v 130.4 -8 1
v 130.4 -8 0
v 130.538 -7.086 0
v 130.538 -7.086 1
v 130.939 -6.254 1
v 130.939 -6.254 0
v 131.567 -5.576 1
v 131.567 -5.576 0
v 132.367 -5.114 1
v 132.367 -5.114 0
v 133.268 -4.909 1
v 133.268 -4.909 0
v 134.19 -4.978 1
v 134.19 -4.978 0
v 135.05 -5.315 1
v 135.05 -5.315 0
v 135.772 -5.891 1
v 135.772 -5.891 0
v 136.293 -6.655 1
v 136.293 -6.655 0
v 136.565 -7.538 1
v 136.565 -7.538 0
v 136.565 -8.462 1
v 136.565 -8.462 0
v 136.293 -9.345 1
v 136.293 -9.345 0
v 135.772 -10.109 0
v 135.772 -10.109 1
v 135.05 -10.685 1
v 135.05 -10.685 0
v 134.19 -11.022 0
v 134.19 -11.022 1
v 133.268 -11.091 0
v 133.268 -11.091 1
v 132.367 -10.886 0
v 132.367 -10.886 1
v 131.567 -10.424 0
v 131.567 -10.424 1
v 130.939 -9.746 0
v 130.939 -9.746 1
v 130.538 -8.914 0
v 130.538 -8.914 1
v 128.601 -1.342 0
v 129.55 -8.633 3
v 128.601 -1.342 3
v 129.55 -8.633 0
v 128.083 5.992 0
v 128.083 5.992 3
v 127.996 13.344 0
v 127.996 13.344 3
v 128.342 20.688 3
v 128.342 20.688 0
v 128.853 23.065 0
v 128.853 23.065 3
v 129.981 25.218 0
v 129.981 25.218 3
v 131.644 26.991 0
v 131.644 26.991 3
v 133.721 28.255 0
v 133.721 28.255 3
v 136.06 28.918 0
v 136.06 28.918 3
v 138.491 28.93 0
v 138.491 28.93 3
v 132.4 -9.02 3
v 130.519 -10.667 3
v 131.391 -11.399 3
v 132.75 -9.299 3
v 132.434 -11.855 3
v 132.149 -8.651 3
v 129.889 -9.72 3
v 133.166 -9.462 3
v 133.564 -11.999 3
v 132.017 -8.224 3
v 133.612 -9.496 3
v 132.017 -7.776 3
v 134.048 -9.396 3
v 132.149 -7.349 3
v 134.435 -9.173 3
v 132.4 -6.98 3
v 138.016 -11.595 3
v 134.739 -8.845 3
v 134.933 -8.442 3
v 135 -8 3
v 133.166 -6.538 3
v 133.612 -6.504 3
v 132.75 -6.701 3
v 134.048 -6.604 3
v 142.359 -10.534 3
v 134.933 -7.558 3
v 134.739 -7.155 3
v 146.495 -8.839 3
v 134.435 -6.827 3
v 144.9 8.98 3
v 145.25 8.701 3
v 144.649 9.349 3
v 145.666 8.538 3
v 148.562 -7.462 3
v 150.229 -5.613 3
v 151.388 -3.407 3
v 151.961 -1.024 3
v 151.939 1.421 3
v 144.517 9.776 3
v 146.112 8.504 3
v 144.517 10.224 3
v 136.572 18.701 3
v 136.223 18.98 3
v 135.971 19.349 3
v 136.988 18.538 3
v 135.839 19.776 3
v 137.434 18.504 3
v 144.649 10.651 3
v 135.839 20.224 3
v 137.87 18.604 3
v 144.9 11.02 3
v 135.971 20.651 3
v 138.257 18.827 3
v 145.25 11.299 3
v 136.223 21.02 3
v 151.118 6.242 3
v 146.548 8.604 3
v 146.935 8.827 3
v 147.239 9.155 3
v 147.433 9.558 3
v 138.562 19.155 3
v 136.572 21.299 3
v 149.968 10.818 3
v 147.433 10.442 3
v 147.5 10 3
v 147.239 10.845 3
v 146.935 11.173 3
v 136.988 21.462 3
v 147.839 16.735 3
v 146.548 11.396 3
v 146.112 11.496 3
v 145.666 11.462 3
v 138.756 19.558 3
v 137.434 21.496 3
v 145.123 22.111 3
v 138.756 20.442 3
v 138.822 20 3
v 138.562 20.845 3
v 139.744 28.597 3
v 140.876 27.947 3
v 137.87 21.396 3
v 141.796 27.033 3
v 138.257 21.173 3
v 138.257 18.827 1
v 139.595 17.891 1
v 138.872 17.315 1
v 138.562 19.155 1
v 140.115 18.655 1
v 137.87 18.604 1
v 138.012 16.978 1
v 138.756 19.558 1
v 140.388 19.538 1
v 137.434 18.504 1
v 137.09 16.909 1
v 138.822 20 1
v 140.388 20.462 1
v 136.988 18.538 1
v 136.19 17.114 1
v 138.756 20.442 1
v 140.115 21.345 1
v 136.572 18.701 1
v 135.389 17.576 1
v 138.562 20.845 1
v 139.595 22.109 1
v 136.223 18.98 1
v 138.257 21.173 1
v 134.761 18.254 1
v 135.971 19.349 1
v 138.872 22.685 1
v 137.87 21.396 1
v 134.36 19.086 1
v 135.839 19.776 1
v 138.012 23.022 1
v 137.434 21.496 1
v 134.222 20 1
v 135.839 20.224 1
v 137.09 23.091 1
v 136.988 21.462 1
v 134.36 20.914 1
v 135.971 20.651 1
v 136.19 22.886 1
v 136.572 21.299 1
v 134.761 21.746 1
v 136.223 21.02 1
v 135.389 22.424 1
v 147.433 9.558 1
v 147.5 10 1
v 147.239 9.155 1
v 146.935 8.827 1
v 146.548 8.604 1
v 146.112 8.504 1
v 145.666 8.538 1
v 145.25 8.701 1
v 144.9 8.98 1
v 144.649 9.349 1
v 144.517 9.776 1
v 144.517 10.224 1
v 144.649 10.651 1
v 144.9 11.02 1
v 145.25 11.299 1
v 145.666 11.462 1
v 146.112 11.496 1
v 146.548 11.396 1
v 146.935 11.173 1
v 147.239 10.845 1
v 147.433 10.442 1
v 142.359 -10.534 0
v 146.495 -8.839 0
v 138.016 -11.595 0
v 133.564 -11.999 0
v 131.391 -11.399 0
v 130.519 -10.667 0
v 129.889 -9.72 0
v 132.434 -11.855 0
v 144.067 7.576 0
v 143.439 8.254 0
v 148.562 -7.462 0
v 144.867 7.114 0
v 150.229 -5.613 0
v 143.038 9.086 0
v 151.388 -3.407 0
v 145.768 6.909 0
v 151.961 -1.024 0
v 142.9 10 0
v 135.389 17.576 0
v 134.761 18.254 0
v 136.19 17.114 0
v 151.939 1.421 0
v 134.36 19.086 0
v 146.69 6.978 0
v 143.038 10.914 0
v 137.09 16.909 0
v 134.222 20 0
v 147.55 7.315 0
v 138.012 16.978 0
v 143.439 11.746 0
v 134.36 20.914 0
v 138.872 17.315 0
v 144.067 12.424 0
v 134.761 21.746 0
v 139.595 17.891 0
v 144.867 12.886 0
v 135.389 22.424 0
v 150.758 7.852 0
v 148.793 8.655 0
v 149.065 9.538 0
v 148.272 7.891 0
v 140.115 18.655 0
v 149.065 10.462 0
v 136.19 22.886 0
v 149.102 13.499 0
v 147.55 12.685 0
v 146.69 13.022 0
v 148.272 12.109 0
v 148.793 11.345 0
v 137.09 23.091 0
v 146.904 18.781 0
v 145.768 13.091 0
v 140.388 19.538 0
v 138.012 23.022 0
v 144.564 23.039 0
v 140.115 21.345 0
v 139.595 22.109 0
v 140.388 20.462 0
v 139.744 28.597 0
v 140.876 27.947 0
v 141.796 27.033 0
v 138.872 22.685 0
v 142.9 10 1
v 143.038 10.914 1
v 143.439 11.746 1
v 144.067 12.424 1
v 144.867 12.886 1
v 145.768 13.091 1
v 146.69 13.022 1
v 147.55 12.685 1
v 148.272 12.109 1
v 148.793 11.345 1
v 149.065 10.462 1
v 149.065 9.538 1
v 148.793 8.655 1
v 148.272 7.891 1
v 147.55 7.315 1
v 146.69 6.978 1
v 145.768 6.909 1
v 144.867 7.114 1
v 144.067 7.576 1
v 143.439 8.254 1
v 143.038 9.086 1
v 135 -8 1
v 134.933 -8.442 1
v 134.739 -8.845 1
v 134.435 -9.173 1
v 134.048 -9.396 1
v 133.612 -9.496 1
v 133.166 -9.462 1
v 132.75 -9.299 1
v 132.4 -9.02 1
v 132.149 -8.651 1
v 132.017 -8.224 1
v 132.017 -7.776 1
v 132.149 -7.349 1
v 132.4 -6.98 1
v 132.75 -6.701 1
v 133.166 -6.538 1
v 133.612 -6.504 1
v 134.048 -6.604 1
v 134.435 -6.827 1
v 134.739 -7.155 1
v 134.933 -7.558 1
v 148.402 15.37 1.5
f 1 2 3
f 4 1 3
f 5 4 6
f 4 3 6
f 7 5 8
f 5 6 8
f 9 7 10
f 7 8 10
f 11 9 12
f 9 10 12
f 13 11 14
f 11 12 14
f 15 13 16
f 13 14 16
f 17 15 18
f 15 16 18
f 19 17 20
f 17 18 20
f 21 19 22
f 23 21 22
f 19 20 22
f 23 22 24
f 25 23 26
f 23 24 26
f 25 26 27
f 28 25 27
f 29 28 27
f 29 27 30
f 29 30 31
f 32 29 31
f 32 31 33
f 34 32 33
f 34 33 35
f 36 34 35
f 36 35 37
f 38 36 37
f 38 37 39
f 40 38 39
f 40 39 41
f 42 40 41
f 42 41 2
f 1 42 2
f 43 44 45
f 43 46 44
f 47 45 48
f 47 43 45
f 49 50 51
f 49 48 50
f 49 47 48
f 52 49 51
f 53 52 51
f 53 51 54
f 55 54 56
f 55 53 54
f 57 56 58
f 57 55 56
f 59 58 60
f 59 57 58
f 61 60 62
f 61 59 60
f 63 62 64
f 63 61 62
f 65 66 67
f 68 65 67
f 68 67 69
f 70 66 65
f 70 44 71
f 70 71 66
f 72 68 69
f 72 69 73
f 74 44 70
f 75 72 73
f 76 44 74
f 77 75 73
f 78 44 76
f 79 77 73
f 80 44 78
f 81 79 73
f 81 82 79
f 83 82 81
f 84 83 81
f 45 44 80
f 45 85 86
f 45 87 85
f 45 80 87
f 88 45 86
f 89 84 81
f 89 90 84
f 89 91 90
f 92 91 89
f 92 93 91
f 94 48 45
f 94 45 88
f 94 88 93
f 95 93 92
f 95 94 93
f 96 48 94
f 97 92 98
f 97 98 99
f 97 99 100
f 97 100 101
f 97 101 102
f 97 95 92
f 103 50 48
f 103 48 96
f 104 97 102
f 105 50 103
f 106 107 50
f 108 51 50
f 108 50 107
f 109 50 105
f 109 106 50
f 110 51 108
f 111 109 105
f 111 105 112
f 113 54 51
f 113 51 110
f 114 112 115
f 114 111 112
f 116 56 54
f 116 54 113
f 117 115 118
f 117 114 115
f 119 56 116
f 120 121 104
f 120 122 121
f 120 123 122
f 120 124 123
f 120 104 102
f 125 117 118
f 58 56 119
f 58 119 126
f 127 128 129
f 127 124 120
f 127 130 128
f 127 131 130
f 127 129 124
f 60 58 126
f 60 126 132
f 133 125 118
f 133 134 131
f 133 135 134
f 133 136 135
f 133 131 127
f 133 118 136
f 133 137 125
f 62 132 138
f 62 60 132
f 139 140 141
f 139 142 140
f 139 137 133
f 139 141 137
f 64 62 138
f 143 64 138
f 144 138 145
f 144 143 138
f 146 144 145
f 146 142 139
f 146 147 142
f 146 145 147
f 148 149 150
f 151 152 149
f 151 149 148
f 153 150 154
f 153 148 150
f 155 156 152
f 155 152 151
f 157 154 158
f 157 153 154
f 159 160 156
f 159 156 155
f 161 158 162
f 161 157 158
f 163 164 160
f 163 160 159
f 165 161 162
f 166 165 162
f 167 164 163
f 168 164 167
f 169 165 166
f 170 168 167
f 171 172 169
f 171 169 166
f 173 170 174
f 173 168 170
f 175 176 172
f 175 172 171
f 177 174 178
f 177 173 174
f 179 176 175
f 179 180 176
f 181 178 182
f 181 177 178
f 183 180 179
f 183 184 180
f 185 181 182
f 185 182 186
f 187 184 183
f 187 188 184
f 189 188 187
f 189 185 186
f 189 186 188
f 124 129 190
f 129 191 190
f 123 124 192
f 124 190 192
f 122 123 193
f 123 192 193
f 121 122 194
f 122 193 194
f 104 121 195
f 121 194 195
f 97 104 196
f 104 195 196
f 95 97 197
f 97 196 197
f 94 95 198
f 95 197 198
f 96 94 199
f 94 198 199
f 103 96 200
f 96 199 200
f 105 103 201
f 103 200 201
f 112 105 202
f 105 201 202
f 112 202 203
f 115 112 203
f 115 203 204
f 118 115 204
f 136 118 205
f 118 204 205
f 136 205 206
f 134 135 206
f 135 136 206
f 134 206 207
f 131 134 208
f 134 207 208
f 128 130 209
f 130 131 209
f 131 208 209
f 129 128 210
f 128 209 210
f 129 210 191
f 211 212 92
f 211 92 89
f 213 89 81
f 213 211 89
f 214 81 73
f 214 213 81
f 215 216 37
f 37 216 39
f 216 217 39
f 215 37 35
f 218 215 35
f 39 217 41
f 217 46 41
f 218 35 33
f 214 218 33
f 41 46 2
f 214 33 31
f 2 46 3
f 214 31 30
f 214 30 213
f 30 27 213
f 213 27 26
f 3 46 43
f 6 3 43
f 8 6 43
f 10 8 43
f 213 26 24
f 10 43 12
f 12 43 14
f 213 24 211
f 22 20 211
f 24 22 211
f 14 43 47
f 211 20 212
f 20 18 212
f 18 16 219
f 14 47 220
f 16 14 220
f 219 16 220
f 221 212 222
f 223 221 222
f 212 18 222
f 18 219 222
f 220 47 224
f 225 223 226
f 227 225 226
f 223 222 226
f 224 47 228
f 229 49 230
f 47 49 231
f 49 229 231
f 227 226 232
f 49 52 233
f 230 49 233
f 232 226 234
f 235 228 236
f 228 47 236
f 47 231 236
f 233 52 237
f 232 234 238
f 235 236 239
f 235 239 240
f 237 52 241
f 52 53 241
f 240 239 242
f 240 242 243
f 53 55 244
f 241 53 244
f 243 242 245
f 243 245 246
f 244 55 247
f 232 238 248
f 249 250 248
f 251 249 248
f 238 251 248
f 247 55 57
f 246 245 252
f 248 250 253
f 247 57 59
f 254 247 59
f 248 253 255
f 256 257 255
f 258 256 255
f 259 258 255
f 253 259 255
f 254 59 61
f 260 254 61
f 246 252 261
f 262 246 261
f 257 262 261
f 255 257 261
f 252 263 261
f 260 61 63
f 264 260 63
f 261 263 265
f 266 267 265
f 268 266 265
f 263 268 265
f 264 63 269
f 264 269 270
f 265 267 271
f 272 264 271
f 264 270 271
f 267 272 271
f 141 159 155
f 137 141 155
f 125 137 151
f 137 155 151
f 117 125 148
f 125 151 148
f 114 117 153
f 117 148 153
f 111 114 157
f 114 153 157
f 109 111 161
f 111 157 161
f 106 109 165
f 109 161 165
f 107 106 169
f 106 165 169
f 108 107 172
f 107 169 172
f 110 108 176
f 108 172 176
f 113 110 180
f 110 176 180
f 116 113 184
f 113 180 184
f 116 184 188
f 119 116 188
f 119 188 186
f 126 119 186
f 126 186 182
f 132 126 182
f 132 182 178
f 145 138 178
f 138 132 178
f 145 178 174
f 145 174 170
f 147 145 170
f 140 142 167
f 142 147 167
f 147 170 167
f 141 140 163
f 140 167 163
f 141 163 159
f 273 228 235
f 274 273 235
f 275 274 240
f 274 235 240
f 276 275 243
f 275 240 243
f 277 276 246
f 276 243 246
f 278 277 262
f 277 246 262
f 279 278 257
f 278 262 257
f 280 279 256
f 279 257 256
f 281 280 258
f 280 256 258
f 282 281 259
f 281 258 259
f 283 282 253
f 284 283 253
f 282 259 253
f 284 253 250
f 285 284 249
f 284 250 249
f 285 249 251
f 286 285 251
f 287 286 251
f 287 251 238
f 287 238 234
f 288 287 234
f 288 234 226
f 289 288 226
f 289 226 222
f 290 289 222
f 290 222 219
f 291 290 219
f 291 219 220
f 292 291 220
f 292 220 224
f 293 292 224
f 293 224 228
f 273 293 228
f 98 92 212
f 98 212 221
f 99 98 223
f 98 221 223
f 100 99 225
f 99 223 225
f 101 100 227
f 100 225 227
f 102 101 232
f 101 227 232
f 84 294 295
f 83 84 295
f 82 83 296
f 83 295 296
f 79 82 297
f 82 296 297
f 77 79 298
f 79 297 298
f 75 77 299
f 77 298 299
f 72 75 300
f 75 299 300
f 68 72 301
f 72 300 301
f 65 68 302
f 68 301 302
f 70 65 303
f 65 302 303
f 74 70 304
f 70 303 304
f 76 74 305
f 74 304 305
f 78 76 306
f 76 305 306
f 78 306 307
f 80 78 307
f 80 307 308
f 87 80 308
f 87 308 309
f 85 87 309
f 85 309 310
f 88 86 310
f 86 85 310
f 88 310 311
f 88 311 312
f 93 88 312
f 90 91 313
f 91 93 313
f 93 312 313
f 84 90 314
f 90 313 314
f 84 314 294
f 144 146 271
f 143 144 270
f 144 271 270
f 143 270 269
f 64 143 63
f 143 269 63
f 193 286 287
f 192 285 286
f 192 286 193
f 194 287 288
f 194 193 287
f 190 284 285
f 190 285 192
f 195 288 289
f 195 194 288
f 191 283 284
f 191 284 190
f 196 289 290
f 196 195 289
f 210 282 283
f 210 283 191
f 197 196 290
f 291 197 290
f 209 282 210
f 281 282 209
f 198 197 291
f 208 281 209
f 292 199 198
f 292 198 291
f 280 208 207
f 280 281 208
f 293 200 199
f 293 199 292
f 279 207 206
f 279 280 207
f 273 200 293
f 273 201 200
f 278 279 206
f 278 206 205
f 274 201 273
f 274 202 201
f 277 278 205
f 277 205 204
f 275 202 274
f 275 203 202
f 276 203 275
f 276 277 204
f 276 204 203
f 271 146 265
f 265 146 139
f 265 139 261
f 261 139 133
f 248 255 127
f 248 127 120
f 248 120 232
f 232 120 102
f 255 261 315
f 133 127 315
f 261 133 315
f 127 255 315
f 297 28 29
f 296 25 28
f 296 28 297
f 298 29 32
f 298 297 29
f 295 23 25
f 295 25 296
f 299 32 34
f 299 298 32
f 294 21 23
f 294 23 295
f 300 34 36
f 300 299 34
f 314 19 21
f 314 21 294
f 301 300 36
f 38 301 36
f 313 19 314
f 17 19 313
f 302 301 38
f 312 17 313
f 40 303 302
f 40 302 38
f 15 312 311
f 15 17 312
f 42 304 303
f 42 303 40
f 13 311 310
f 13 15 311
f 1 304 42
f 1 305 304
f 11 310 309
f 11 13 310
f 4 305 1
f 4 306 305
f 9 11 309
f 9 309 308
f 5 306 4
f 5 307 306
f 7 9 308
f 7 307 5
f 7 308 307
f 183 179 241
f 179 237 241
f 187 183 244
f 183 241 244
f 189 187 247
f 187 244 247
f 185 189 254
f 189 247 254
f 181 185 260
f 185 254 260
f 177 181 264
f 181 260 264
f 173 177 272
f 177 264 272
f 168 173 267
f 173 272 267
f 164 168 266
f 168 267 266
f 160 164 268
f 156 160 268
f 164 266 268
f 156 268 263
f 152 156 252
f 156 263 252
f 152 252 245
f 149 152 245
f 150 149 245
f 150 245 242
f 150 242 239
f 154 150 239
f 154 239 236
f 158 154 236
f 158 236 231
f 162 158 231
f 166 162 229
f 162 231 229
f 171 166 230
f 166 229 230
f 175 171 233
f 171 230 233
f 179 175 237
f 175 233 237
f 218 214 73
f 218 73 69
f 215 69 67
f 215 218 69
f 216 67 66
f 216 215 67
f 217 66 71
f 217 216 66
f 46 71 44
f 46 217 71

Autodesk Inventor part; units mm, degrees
ref_plane "YZ Plane" through (0, 0, 0) normal (1, 0, 0) x (0, 1, 0)
ref_plane "XZ Plane" through (0, 0, 0) normal (0, 1, 0) x (-1, 0, 0)
ref_plane "XY Plane" through (0, 0, 0) normal (0, 0, 1) x (1, 0, 0)
sketch "スケッチ1" plane through (0, 0, 0) normal (0, 0, 1) x (1, 0, 0)
  line L0 (108, 72.831817) -> (108, -27.637331) construction
  circle A0 centre (90, 27) radius 3
  circle A1 centre (104.07345, 2) radius 6.025
  circle A2 centre (90, 27) radius 1.5
  circle A3 centre (104.07345, 2) radius 1.5
  circle A4 centre (82.04031, 11.281864) radius 1.5
  circle A5 centre (82.5, -8) radius 3
  circle A6 centre (82.5, -8) radius 1.5
  arc A7 (66.645247, -5.64) -> (72.915941, -4.36) centre (69.780594, -5) ccw
  arc A8 (72.724551, 23.828571) -> (66.645247, -5.64) centre (104.07345, 2) ccw
  arc A9 (77.976723, 20.171429) -> (72.915941, -4.36) centre (104.07345, 2) ccw
  arc A10 (77.976723, 20.171429) -> (72.724551, 23.828571) centre (75.350637, 22) ccw
  circle A11 centre (137.322151, 20) radius 1.25
  circle A12 centre (133.5, -8) radius 3
  circle A13 centre (133.5, -8) radius 1.5
  circle A14 centre (146, 10) radius 1.5
  arc A15 (-6.089587, 13.373015) -> (73.990447, 1.93301) centre (42.288654, 66.020578) ccw construction
  line L1 (108, 72.831817) -> (108, -27.637331) construction
  arc A16 (142.009553, 1.93301) -> (222.089587, 13.373015) centre (173.711346, 66.020578) ccw construction
  arc A17 (142.29705, -19.072921) -> (142.660887, 27.253552) centre (125.709293, 4.222021) ccw
  arc A18 (136.80781, 35.127338) -> (180.06622, 10.718677) centre (180.861669, 62.665248) ccw
  circle A19 centre (137.322151, 20) radius 9.006449
  arc A20 (128.322651, 20.353731) -> (130.555913, -8.5765) centre (253.226204, 15.444317) ccw
  arc A21 (133.414591, -10.998784) -> (152.948723, -4.485529) centre (134.268683, 18.989056) ccw
  arc A22 (35.93378, 10.718677) -> (79.19219, 35.127338) centre (35.138331, 62.665248) ccw
  arc A23 (73.339113, 27.253552) -> (73.70295, -19.072921) centre (90.290707, 4.222021) ccw
  arc A24 (90.887703, 29.865656) -> (71.118535, 25.188537) centre (84.969685, 10.761283) ccw
  arc A25 (109.559222, 4.491371) -> (92.075879, 29.165808) centre (36.719095, -28.589074) ccw
  arc A26 (80.567193, -10.294397) -> (70.653319, -16.566942) centre (76.603177, -15) ccw
  circle A27 centre (76.603177, -15) radius 5 construction
  circle A28 centre (94, -11) radius 1.5
  circle A29 centre (94, -11) radius 3
  arc A30 (103.111347, -3.947687) -> (84.657245, -10.084777) centre (99.757959, -24.678215) ccw
  line L2 (108, 72.831817) -> (108, -27.637331) construction
  circle A31 centre (90, 27) radius 3
  circle A32 centre (104.07345, 2) radius 6.025
  circle A33 centre (90, 27) radius 1.5
  circle A34 centre (104.07345, 2) radius 1.5
  circle A35 centre (82.04031, 11.281864) radius 1.5
  circle A36 centre (82.5, -8) radius 3
  circle A37 centre (82.5, -8) radius 1.5
  arc A38 (66.645247, -5.64) -> (72.915941, -4.36) centre (69.780594, -5) ccw
  arc A39 (72.724551, 23.828571) -> (66.645247, -5.64) centre (104.07345, 2) ccw
  arc A40 (77.976723, 20.171429) -> (72.915941, -4.36) centre (104.07345, 2) ccw
  arc A41 (77.976723, 20.171429) -> (72.724551, 23.828571) centre (75.350637, 22) ccw
  circle A42 centre (137.322151, 20) radius 1.25
  circle A43 centre (133.5, -8) radius 4
  circle A44 centre (133.5, -8) radius 1.5
  circle A45 centre (146, 10) radius 1.5
  arc A46 (-6.089587, 13.373015) -> (73.990447, 1.93301) centre (42.288654, 66.020578) ccw construction
  line L3 (108, 72.831817) -> (108, -27.637331) construction
  arc A47 (142.009553, 1.93301) -> (222.089587, 13.373015) centre (173.711346, 66.020578) ccw construction
  arc A48 (142.29705, -19.072921) -> (142.660887, 27.253552) centre (125.709293, 4.222021) ccw
  arc A49 (136.80781, 35.127338) -> (180.06622, 10.718677) centre (180.861669, 62.665248) ccw
  circle A50 centre (137.322151, 20) radius 9.006449
  arc A51 (128.342019, 20.688016) -> (129.550355, -8.632697) centre (252.976757, 11.139082) ccw
  arc A52 (133.563777, -11.999492) -> (152.948723, -4.485529) centre (133.08545, 17.996695) ccw
  arc A53 (35.93378, 10.718677) -> (79.19219, 35.127338) centre (35.138331, 62.665248) ccw
  arc A54 (73.339113, 27.253552) -> (73.70295, -19.072921) centre (90.290707, 4.222021) ccw
  arc A55 (90.887703, 29.865656) -> (71.118535, 25.188537) centre (84.969685, 10.761283) ccw
  arc A56 (109.559222, 4.491371) -> (92.075879, 29.165808) centre (36.719095, -28.589074) ccw
  arc A57 (80.567193, -10.294397) -> (70.653319, -16.566942) centre (76.603177, -15) ccw
  circle A58 centre (76.603177, -15) radius 5 construction
  circle A59 centre (94, -11) radius 1.5
  circle A60 centre (94, -11) radius 3
  arc A61 (103.111347, -3.947687) -> (84.657245, -10.084777) centre (99.757959, -24.678215) ccw
  circle A62 centre (137.322151, 20) radius 1.5
  point P0 (0, 0)
  point P1 (0, 0)
  point P2 (0, 0)
  point P3 (153.490711, -2.560367)
  point P4 (70.420594, -8.135347)
  point P5 (68.814065, 23.104865)
  point P6 (143.754929, 26.303609)
  point P7 (147.185935, 23.104865)
  point P8 (0, 0)
  point P9 (153.490711, -2.560367)
  point P10 (152.948723, -4.485529)
  dimension "d0" = 2
  dimension "d1" = 30
  dimension "d2" = 125
  dimension "d3" = 80
  dimension "d4" = 20
  dimension "d5" = 6
  dimension "d6" = 21
  dimension "d14" = 2
  dimension "d15" = 30
  dimension "d16" = 125
  dimension "d17" = 80
  dimension "d18" = 20
  dimension "d19" = 6
  dimension "d20" = 21
  dimension "d25" = 3
extrude "押し出し1" add sketch "スケッチ1" along normal blind 3 contours A12 | A12 A20 A43 A21 | A12 A21 A43 A20 | A43 A51 A19 A20 | A20 A19 A18 A17 A21 A43 | A21 A52 A43 | A19
fillet "フィレット1" radius 3 1 edges at (152.9487, -4.4855, 1.5)
fillet "フィレット2" radius 5 1 edges at (147.1859, 23.1049, 1.5)
sketch "スケッチ3" plane through (0, 0, 0) normal (0, 0, -1) x (-1, 0, 0)
  arc A0 (-146.917757, 23.334729) -> (-147.45257, 22.797215) centre (-143.650945, 19.549502) ccw
  arc A1 (-147.45257, 22.797215) -> (-153.216482, -3.598627) centre (-125.709293, 4.222021) ccw
  arc A2 (-152.246999, -5.086525) -> (-133.563777, -11.999492) centre (-133.08545, 17.996695) ccw
  arc A3 (-133.563777, -11.999492) -> (-129.550355, -8.632697) centre (-133.5, -8) ccw
  arc A4 (-129.550355, -8.632697) -> (-128.342019, 20.688016) centre (-252.976757, 11.139082) ccw
  arc A5 (-128.342019, 20.688016) -> (-143.754929, 26.303609) centre (-137.322151, 20) ccw
  arc A6 (-146.917757, 23.334729) -> (-143.754929, 26.303609) centre (-180.861669, 62.665248) ccw
  circle A7 centre (-133.5, -8) radius 1.5
  circle A8 centre (-146, 10) radius 1.5
  circle A9 centre (-137.322151, 20) radius 3.1
  circle A10 centre (-146, 10) radius 3.1
  circle A11 centre (-133.5, -8) radius 3.1
  arc A12 (-153.216482, -3.598627) -> (-152.246999, -5.086525) centre (-150.330844, -2.778203) ccw
  circle A13 centre (-137.322151, 20) radius 1.5
  point P0 (0, 0)
  dimension "d21" = 6.2
  dimension "d22" = 6.2
  dimension "d23" = 6.2
extrude "押し出し2" cut sketch "スケッチ3" against normal blind 1 contours A9 | A10 | A11
sketch "スケッチ4" plane through (0, 0, 3) normal (0, 0, 1) x (1, 0, 0)
  arc A0 (147.45257, 22.797215) -> (146.917757, 23.334729) centre (143.650945, 19.549502) ccw
  arc A1 (143.754929, 26.303609) -> (146.917757, 23.334729) centre (180.861669, 62.665248) ccw
  arc A2 (143.754929, 26.303609) -> (128.342019, 20.688016) centre (137.322151, 20) ccw
  arc A3 (128.342019, 20.688016) -> (129.550355, -8.632697) centre (252.976757, 11.139082) ccw
  arc A4 (129.550355, -8.632697) -> (133.563777, -11.999492) centre (133.5, -8) ccw
  arc A5 (133.563777, -11.999492) -> (152.246999, -5.086525) centre (133.08545, 17.996695) ccw
  arc A6 (152.246999, -5.086525) -> (153.216482, -3.598627) centre (150.330844, -2.778203) ccw
  arc A7 (153.216482, -3.598627) -> (147.45257, 22.797215) centre (125.709293, 4.222021) ccw
  circle A8 centre (146, 10) radius 1.5
  circle A9 centre (137.322151, 20) radius 1.5
  circle A10 centre (133.5, -8) radius 1.5
  arc A11 (153.216482, -3.598627) -> (147.45257, 22.797215) centre (125.709293, 4.222021) ccw
  arc A12 (143.754929, 26.303609) -> (128.342019, 20.688016) centre (137.322151, 20) ccw
  spline S0 degree 2 poles (140.758179, 28.325252) (151.754441, 15.122285) (152.532068, -5.69497) knots 0 0 0 1 1 1
  circle A13 centre (146, 10) radius 3.1
  point P0 (0, 0)
  point P1 (148.894459, 14.077022)
  point P2 (140.758179, 28.325252)
  point P3 (153.361481, -3.069376)
  point P4 (152.496355, -4.854392)
  dimension "d36" = 5
  dimension "d37" = 13
  dimension "d38" = 17
  dimension "d39" = 36
extrude "押し出し3" cut sketch "スケッチ4" against normal blind 10 contours A7 A6 S0 A2 A1 A0
fillet "フィレット3" radius 10 1 edges at (152.4964, -4.8544, 1.5)
fillet "フィレット4" radius 5 1 edges at (140.7582, 28.3253, 1.5)
properties part number "アンノーン後" material "アルミニウム 2014-T4"
